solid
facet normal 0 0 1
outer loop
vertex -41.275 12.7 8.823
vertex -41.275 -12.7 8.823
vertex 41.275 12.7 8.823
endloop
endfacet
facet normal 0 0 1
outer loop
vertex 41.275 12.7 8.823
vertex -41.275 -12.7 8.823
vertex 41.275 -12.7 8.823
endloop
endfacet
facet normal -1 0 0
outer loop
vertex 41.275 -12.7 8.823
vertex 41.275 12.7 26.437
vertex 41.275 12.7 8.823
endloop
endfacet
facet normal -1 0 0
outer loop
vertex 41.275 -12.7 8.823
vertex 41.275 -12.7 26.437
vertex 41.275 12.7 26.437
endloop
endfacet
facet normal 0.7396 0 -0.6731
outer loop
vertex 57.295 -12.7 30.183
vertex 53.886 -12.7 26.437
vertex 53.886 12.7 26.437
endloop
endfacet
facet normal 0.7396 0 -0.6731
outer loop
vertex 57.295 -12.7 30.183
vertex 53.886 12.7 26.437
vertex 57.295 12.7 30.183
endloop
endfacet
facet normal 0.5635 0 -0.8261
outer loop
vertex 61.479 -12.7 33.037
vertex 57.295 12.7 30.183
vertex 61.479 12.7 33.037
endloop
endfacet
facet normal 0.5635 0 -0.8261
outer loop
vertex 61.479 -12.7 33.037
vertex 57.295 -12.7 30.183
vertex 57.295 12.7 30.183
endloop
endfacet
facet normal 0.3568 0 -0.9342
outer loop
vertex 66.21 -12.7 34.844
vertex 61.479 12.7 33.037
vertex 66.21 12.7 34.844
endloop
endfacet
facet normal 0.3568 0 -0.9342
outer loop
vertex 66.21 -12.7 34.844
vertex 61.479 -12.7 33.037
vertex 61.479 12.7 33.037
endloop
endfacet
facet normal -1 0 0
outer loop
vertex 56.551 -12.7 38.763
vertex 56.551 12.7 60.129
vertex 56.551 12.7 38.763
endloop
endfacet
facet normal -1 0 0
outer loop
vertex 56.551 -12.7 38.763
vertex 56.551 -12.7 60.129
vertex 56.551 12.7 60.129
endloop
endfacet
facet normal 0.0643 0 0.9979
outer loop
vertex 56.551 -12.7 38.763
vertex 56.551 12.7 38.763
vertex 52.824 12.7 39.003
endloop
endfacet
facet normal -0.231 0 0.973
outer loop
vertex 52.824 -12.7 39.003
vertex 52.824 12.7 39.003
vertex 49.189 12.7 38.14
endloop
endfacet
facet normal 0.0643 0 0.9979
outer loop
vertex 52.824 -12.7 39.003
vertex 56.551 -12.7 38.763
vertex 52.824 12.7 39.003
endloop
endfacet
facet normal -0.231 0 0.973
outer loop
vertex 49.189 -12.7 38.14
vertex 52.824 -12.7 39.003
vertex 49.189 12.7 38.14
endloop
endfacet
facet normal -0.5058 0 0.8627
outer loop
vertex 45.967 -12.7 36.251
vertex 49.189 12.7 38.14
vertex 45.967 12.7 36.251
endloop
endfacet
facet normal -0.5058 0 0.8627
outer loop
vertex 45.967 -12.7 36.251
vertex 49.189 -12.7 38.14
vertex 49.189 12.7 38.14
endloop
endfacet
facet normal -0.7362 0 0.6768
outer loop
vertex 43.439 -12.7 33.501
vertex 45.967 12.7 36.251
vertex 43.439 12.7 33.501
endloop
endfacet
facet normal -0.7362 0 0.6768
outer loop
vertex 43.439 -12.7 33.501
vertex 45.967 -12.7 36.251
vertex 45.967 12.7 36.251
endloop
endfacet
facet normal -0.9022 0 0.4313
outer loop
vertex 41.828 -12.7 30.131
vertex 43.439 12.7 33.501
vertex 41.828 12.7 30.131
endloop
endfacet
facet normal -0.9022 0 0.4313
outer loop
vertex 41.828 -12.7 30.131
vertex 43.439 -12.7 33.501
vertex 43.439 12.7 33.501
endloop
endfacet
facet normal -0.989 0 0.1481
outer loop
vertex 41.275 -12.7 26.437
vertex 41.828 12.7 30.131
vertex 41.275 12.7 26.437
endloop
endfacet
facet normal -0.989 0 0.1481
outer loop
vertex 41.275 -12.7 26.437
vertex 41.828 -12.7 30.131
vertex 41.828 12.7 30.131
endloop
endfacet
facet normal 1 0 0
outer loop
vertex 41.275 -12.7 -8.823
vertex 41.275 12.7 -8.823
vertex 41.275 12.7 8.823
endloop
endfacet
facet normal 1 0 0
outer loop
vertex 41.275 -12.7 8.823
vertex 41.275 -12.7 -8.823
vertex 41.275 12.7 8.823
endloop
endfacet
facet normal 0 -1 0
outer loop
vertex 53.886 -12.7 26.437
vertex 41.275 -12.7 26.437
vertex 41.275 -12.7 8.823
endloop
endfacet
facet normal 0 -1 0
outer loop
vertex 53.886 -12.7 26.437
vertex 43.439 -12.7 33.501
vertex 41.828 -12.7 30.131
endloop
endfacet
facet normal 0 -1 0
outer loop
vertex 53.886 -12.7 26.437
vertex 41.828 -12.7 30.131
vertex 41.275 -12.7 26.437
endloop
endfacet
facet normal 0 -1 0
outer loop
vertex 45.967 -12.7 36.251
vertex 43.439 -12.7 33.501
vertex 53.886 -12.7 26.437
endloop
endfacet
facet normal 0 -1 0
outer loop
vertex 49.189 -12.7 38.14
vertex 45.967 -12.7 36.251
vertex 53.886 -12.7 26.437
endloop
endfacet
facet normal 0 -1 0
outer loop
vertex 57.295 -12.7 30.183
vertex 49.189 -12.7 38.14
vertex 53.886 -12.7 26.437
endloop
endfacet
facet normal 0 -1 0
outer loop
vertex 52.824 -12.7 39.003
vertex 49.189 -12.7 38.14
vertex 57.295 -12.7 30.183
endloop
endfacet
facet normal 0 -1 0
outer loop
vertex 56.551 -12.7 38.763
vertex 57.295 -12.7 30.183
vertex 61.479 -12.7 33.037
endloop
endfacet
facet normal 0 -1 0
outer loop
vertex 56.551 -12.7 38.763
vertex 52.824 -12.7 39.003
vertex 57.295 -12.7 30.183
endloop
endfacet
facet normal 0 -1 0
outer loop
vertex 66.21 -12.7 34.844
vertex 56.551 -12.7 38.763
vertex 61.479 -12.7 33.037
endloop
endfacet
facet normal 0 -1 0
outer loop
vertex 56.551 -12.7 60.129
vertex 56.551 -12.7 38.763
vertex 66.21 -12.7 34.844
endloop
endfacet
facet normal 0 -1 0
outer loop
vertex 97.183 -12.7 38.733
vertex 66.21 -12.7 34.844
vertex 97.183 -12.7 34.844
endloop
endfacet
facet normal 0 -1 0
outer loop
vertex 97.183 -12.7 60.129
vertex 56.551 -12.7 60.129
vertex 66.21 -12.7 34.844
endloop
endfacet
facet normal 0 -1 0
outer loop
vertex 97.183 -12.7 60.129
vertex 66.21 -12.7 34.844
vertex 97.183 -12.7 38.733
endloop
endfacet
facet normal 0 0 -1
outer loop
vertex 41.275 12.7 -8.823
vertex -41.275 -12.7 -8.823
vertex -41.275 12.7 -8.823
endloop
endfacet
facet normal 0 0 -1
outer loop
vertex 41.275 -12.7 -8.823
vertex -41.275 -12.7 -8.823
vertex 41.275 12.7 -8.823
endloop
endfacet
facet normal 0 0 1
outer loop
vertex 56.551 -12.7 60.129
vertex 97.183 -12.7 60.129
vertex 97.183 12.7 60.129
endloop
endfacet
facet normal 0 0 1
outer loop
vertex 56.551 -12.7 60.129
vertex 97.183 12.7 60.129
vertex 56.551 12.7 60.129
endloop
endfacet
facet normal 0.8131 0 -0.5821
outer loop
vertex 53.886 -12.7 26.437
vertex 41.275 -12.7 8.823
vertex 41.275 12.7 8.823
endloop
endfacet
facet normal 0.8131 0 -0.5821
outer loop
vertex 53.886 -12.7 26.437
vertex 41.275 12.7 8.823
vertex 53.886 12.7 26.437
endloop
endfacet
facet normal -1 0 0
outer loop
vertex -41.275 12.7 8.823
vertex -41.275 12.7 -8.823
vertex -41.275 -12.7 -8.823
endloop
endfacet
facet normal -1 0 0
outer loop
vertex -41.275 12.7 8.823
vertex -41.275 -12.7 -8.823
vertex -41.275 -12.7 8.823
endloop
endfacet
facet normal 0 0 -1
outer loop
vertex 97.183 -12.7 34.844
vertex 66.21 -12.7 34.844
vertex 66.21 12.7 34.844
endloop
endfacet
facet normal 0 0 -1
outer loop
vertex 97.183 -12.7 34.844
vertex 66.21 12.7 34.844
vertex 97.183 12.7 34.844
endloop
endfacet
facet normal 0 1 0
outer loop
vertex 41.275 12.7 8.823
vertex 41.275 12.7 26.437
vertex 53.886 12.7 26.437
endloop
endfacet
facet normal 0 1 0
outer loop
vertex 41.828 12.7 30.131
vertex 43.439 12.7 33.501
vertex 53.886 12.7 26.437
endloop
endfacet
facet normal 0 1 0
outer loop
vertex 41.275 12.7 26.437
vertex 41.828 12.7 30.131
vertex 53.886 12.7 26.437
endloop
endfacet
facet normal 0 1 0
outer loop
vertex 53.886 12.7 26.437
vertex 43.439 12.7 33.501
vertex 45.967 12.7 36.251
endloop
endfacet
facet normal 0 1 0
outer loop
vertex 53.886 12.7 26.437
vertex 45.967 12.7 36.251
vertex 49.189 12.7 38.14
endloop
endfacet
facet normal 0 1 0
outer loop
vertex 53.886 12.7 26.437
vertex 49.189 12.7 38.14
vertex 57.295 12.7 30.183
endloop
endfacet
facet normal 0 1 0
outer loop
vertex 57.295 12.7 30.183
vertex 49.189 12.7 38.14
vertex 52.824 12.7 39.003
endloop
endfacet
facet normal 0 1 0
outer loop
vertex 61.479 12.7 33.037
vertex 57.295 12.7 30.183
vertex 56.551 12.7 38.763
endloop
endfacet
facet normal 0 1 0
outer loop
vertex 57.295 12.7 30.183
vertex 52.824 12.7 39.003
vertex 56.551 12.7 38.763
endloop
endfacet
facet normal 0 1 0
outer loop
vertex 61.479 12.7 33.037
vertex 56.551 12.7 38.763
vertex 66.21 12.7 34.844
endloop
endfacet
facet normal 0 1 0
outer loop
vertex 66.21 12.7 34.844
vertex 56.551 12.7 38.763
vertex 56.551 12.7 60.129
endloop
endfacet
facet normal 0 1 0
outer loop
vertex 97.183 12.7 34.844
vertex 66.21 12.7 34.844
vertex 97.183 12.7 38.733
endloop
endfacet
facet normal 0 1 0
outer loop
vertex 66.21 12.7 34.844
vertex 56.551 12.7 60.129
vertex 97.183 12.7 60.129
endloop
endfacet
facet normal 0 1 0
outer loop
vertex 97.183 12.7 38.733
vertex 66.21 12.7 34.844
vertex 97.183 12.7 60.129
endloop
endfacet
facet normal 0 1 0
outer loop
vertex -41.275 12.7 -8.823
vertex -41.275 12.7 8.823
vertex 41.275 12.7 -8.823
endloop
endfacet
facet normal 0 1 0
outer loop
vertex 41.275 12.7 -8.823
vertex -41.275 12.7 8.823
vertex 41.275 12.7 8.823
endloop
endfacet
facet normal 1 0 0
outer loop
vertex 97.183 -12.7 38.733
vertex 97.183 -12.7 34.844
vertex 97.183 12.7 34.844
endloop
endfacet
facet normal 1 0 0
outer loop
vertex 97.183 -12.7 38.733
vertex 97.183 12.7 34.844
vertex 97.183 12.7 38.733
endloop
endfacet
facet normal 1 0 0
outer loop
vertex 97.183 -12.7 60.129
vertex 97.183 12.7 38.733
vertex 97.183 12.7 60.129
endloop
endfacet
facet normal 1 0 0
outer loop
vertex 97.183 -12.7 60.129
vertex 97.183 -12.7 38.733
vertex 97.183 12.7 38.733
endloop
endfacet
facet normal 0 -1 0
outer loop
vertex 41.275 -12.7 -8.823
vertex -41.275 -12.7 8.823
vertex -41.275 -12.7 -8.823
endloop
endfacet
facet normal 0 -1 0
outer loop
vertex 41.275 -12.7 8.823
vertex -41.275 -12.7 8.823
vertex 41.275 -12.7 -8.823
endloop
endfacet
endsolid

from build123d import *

# Parameters (mm, degrees)
F0_W     = 20.3160279515
F0_H     = 3.888219498
F1_DEPTH = 12.7
F0_W_2   = 82.55
F0_H_2   = 17.6465612206


with BuildPart() as f1:
    # F0 (on Front) → F1 (new body, symmetric)
    with BuildSketch(Plane.XZ):
        with BuildLine():
            Line((41.275, 26.4365587761), (41.275, 8.8232806103))
            Line((41.275, 8.8232806103), (53.8858462351, 26.4365587761))
            ThreePointArc((53.8858462351, 26.4365587761), (59.3031752306, 31.7323772422), (66.2102704506, 34.8444797939))
            Line((66.2102704506, 34.8444797939), (56.5511865373, 34.8444797939))
            Line((56.5511865373, 34.8444797939), (56.5511865373, 38.7625233971))
            ThreePointArc((56.5511865373, 38.7625233971), (45.9668423189, 36.2509777472), (41.275, 26.4365587761))
        make_face()
        with BuildLine():
            ThreePointArc((56.6855553593, 38.7326992919), (56.6184116374, 38.747794664), (56.5511865373, 38.7625233971))
            Line((56.5511865373, 38.7625233971), (56.5511865373, 34.8444797939))
            Line((56.5511865373, 34.8444797939), (66.2102704506, 34.8444797939))
            ThreePointArc((66.2102704506, 34.8444797939), (71.5387424697, 35.508505706), (76.8672144887, 34.8444797939))
            Line((76.8672144887, 34.8444797939), (76.8672144887, 38.7326992919))
            Line((76.8672144887, 38.7326992919), (56.6855553593, 38.7326992919))
        make_face()
        with BuildLine():
            Line((56.5511865373, 60.1290911436), (56.5511865373, 38.7625233971))
            ThreePointArc((56.5511865373, 38.7625233971), (56.6184116374, 38.747794664), (56.6855553593, 38.7326992919))
            Line((56.6855553593, 38.7326992919), (56.6855553593, 60.1290911436))
            Line((56.6855553593, 60.1290911436), (56.5511865373, 60.1290911436))
        make_face()
        with BuildLine():
            ThreePointArc((76.8672144887, 34.8444797939), (71.5387424697, 35.508505706), (66.2102704506, 34.8444797939))
            Line((66.2102704506, 34.8444797939), (76.8672144887, 34.8444797939))
        make_face()
        Polygon((56.6855553593, 60.1290911436), (56.6855553593, 38.7326992919), (76.8672144887, 38.7326992919), (97.1832424402, 38.7326992919), (97.1832424402, 60.1290911436), align=None)
        with Locations((87.0252284645, 36.7885895429)):
            Rectangle(F0_W, F0_H)
    extrude(amount=F1_DEPTH, both=True)


with BuildPart() as f1b:
    # F0 (on Front) → F1, piece 2 (new body, symmetric)
    with BuildSketch(Plane.XZ):
        Rectangle(F0_W_2, F0_H_2)
    extrude(amount=F1_DEPTH, both=True)


solid = Compound([f1.part, f1b.part])
